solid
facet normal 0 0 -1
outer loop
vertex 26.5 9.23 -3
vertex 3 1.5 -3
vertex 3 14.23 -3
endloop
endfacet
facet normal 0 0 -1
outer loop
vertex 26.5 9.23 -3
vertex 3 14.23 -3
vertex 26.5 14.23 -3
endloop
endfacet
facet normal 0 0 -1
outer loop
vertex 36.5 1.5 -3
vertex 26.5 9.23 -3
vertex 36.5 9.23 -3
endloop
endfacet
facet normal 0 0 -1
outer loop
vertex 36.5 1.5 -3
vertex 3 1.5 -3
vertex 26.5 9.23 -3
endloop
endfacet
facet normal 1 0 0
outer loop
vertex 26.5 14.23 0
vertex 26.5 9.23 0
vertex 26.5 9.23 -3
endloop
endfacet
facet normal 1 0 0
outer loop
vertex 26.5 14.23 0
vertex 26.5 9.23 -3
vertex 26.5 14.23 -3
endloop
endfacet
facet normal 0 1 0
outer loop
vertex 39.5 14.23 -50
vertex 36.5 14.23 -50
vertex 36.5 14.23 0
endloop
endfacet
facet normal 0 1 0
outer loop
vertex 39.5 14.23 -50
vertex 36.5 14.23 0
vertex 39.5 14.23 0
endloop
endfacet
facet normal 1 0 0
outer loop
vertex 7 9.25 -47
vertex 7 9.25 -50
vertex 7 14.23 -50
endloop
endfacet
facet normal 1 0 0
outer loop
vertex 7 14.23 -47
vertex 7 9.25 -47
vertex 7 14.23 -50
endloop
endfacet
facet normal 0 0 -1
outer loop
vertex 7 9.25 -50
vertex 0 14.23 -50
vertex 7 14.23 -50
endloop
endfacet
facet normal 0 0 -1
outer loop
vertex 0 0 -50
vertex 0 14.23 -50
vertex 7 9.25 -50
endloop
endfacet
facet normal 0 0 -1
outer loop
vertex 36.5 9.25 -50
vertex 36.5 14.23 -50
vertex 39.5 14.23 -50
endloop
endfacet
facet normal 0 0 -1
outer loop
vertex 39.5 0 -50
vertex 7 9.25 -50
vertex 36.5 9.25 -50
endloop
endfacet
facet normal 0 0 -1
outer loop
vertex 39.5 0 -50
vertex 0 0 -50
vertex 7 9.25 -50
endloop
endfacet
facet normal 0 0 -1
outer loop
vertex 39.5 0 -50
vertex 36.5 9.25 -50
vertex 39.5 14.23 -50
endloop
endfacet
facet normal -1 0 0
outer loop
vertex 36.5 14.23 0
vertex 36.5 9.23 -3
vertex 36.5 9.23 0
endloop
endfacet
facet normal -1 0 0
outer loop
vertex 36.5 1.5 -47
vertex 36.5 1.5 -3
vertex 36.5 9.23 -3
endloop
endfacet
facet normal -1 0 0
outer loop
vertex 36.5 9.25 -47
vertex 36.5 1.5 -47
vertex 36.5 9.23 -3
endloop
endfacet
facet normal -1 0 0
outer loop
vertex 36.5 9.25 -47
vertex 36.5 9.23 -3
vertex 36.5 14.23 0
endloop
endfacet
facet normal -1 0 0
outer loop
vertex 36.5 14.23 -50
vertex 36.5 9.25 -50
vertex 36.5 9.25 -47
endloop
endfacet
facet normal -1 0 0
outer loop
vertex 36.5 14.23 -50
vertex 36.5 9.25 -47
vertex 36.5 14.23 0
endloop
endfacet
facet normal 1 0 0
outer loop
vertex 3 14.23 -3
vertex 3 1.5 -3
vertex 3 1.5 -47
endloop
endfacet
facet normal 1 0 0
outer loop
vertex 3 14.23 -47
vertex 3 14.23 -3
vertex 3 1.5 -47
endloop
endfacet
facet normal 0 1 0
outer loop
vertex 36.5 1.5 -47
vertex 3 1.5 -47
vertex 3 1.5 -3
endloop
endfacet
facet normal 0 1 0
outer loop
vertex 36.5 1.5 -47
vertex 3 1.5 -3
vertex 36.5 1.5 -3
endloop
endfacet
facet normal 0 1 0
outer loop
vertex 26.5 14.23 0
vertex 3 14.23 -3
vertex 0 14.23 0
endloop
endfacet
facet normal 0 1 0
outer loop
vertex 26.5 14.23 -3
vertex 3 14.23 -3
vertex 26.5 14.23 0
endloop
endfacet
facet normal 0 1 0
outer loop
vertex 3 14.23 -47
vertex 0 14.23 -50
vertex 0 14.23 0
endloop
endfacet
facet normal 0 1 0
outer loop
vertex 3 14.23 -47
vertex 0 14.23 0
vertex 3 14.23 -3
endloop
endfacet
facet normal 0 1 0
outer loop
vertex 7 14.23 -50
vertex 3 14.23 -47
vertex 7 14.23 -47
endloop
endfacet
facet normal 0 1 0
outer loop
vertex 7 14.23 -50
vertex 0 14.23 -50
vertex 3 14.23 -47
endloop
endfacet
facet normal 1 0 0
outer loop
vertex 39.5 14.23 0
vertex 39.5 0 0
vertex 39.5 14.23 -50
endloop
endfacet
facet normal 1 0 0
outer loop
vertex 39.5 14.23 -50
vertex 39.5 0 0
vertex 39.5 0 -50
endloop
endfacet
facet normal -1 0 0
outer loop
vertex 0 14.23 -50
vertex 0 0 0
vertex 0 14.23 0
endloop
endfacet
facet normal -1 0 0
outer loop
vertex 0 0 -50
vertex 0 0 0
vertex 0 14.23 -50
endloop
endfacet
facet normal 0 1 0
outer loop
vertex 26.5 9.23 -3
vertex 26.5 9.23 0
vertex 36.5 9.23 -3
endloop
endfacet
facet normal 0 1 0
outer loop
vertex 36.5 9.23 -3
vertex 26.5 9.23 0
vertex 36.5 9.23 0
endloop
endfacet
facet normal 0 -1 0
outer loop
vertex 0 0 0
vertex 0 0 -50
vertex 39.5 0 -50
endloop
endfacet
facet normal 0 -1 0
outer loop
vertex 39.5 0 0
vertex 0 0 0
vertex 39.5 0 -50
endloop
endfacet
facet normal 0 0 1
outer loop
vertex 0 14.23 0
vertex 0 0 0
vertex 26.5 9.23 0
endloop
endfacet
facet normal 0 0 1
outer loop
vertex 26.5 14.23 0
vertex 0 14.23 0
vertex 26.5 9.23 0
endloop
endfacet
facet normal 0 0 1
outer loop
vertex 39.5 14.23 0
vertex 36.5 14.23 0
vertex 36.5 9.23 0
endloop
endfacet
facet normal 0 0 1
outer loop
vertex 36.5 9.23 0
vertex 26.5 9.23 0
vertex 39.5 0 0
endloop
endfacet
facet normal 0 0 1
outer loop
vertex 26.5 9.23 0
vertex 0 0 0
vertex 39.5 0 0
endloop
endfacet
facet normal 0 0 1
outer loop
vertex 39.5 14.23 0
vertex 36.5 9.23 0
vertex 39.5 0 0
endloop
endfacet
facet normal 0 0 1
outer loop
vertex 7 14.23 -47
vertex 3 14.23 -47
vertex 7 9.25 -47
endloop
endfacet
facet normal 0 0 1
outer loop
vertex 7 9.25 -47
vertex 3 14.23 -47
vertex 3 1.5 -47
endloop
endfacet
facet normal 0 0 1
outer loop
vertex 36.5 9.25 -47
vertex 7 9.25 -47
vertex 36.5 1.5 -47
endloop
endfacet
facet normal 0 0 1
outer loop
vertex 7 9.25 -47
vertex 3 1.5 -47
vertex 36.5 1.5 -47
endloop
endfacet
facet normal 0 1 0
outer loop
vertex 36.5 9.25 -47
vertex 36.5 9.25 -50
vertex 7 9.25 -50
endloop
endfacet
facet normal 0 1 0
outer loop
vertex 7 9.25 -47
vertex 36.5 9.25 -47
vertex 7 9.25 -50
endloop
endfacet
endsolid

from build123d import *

# Parameters (mm, degrees)
SKETCH1_W           = 39.5
SKETCH1_H           = 50
BOSS_EXTRUDE1_DEPTH = 1.5
SKETCH3_W           = 39.5
SKETCH3_H           = 50
SKETCH3_W_2         = 33.5
SKETCH3_H_2         = 44
BOSS_EXTRUDE2_DEPTH = 12.73
SKETCH6_W           = 10
SKETCH6_H           = 5
CUT_EXTRUDE2_DEPTH  = 11.2
SKETCH7_W           = 29.5
SKETCH7_H           = 4.98
CUT_EXTRUDE3_DEPTH  = 3.3


with BuildPart() as part:
    # Sketch1 → Boss-Extrude1 (new body)
    with BuildSketch(Plane(origin=(0, 0, 0), x_dir=(1, 0, 0), z_dir=(0, 1, 0))):
        with Locations((19.75, 25)):
            Rectangle(SKETCH1_W, SKETCH1_H)
    extrude(amount=BOSS_EXTRUDE1_DEPTH)

    # Sketch3 → Boss-Extrude2 (add)
    with BuildSketch(Plane(origin=(0, 1.5, 0), x_dir=(1, 0, 0), z_dir=(0, 1, 0))):
        with Locations((19.75, 25)):
            Rectangle(SKETCH3_W, SKETCH3_H)
        with Locations((19.75, 25)):
            Rectangle(SKETCH3_W_2, SKETCH3_H_2, mode=Mode.SUBTRACT)
    extrude(amount=BOSS_EXTRUDE2_DEPTH)

    # Sketch6 → Cut-Extrude2 (cut)
    with BuildSketch(Plane.XY):
        with Locations((31.5, 11.73)):
            Rectangle(SKETCH6_W, SKETCH6_H)
    extrude(amount=-CUT_EXTRUDE2_DEPTH, mode=Mode.SUBTRACT)

    # Sketch7 → Cut-Extrude3 (cut)
    with BuildSketch(Plane(origin=(0, 0, -50), x_dir=(-1, 0, 0), z_dir=(0, 0, -1))):
        with Locations((-21.75, 11.74)):
            Rectangle(SKETCH7_W, SKETCH7_H)
    extrude(amount=-CUT_EXTRUDE3_DEPTH, mode=Mode.SUBTRACT)


solid = part.part
